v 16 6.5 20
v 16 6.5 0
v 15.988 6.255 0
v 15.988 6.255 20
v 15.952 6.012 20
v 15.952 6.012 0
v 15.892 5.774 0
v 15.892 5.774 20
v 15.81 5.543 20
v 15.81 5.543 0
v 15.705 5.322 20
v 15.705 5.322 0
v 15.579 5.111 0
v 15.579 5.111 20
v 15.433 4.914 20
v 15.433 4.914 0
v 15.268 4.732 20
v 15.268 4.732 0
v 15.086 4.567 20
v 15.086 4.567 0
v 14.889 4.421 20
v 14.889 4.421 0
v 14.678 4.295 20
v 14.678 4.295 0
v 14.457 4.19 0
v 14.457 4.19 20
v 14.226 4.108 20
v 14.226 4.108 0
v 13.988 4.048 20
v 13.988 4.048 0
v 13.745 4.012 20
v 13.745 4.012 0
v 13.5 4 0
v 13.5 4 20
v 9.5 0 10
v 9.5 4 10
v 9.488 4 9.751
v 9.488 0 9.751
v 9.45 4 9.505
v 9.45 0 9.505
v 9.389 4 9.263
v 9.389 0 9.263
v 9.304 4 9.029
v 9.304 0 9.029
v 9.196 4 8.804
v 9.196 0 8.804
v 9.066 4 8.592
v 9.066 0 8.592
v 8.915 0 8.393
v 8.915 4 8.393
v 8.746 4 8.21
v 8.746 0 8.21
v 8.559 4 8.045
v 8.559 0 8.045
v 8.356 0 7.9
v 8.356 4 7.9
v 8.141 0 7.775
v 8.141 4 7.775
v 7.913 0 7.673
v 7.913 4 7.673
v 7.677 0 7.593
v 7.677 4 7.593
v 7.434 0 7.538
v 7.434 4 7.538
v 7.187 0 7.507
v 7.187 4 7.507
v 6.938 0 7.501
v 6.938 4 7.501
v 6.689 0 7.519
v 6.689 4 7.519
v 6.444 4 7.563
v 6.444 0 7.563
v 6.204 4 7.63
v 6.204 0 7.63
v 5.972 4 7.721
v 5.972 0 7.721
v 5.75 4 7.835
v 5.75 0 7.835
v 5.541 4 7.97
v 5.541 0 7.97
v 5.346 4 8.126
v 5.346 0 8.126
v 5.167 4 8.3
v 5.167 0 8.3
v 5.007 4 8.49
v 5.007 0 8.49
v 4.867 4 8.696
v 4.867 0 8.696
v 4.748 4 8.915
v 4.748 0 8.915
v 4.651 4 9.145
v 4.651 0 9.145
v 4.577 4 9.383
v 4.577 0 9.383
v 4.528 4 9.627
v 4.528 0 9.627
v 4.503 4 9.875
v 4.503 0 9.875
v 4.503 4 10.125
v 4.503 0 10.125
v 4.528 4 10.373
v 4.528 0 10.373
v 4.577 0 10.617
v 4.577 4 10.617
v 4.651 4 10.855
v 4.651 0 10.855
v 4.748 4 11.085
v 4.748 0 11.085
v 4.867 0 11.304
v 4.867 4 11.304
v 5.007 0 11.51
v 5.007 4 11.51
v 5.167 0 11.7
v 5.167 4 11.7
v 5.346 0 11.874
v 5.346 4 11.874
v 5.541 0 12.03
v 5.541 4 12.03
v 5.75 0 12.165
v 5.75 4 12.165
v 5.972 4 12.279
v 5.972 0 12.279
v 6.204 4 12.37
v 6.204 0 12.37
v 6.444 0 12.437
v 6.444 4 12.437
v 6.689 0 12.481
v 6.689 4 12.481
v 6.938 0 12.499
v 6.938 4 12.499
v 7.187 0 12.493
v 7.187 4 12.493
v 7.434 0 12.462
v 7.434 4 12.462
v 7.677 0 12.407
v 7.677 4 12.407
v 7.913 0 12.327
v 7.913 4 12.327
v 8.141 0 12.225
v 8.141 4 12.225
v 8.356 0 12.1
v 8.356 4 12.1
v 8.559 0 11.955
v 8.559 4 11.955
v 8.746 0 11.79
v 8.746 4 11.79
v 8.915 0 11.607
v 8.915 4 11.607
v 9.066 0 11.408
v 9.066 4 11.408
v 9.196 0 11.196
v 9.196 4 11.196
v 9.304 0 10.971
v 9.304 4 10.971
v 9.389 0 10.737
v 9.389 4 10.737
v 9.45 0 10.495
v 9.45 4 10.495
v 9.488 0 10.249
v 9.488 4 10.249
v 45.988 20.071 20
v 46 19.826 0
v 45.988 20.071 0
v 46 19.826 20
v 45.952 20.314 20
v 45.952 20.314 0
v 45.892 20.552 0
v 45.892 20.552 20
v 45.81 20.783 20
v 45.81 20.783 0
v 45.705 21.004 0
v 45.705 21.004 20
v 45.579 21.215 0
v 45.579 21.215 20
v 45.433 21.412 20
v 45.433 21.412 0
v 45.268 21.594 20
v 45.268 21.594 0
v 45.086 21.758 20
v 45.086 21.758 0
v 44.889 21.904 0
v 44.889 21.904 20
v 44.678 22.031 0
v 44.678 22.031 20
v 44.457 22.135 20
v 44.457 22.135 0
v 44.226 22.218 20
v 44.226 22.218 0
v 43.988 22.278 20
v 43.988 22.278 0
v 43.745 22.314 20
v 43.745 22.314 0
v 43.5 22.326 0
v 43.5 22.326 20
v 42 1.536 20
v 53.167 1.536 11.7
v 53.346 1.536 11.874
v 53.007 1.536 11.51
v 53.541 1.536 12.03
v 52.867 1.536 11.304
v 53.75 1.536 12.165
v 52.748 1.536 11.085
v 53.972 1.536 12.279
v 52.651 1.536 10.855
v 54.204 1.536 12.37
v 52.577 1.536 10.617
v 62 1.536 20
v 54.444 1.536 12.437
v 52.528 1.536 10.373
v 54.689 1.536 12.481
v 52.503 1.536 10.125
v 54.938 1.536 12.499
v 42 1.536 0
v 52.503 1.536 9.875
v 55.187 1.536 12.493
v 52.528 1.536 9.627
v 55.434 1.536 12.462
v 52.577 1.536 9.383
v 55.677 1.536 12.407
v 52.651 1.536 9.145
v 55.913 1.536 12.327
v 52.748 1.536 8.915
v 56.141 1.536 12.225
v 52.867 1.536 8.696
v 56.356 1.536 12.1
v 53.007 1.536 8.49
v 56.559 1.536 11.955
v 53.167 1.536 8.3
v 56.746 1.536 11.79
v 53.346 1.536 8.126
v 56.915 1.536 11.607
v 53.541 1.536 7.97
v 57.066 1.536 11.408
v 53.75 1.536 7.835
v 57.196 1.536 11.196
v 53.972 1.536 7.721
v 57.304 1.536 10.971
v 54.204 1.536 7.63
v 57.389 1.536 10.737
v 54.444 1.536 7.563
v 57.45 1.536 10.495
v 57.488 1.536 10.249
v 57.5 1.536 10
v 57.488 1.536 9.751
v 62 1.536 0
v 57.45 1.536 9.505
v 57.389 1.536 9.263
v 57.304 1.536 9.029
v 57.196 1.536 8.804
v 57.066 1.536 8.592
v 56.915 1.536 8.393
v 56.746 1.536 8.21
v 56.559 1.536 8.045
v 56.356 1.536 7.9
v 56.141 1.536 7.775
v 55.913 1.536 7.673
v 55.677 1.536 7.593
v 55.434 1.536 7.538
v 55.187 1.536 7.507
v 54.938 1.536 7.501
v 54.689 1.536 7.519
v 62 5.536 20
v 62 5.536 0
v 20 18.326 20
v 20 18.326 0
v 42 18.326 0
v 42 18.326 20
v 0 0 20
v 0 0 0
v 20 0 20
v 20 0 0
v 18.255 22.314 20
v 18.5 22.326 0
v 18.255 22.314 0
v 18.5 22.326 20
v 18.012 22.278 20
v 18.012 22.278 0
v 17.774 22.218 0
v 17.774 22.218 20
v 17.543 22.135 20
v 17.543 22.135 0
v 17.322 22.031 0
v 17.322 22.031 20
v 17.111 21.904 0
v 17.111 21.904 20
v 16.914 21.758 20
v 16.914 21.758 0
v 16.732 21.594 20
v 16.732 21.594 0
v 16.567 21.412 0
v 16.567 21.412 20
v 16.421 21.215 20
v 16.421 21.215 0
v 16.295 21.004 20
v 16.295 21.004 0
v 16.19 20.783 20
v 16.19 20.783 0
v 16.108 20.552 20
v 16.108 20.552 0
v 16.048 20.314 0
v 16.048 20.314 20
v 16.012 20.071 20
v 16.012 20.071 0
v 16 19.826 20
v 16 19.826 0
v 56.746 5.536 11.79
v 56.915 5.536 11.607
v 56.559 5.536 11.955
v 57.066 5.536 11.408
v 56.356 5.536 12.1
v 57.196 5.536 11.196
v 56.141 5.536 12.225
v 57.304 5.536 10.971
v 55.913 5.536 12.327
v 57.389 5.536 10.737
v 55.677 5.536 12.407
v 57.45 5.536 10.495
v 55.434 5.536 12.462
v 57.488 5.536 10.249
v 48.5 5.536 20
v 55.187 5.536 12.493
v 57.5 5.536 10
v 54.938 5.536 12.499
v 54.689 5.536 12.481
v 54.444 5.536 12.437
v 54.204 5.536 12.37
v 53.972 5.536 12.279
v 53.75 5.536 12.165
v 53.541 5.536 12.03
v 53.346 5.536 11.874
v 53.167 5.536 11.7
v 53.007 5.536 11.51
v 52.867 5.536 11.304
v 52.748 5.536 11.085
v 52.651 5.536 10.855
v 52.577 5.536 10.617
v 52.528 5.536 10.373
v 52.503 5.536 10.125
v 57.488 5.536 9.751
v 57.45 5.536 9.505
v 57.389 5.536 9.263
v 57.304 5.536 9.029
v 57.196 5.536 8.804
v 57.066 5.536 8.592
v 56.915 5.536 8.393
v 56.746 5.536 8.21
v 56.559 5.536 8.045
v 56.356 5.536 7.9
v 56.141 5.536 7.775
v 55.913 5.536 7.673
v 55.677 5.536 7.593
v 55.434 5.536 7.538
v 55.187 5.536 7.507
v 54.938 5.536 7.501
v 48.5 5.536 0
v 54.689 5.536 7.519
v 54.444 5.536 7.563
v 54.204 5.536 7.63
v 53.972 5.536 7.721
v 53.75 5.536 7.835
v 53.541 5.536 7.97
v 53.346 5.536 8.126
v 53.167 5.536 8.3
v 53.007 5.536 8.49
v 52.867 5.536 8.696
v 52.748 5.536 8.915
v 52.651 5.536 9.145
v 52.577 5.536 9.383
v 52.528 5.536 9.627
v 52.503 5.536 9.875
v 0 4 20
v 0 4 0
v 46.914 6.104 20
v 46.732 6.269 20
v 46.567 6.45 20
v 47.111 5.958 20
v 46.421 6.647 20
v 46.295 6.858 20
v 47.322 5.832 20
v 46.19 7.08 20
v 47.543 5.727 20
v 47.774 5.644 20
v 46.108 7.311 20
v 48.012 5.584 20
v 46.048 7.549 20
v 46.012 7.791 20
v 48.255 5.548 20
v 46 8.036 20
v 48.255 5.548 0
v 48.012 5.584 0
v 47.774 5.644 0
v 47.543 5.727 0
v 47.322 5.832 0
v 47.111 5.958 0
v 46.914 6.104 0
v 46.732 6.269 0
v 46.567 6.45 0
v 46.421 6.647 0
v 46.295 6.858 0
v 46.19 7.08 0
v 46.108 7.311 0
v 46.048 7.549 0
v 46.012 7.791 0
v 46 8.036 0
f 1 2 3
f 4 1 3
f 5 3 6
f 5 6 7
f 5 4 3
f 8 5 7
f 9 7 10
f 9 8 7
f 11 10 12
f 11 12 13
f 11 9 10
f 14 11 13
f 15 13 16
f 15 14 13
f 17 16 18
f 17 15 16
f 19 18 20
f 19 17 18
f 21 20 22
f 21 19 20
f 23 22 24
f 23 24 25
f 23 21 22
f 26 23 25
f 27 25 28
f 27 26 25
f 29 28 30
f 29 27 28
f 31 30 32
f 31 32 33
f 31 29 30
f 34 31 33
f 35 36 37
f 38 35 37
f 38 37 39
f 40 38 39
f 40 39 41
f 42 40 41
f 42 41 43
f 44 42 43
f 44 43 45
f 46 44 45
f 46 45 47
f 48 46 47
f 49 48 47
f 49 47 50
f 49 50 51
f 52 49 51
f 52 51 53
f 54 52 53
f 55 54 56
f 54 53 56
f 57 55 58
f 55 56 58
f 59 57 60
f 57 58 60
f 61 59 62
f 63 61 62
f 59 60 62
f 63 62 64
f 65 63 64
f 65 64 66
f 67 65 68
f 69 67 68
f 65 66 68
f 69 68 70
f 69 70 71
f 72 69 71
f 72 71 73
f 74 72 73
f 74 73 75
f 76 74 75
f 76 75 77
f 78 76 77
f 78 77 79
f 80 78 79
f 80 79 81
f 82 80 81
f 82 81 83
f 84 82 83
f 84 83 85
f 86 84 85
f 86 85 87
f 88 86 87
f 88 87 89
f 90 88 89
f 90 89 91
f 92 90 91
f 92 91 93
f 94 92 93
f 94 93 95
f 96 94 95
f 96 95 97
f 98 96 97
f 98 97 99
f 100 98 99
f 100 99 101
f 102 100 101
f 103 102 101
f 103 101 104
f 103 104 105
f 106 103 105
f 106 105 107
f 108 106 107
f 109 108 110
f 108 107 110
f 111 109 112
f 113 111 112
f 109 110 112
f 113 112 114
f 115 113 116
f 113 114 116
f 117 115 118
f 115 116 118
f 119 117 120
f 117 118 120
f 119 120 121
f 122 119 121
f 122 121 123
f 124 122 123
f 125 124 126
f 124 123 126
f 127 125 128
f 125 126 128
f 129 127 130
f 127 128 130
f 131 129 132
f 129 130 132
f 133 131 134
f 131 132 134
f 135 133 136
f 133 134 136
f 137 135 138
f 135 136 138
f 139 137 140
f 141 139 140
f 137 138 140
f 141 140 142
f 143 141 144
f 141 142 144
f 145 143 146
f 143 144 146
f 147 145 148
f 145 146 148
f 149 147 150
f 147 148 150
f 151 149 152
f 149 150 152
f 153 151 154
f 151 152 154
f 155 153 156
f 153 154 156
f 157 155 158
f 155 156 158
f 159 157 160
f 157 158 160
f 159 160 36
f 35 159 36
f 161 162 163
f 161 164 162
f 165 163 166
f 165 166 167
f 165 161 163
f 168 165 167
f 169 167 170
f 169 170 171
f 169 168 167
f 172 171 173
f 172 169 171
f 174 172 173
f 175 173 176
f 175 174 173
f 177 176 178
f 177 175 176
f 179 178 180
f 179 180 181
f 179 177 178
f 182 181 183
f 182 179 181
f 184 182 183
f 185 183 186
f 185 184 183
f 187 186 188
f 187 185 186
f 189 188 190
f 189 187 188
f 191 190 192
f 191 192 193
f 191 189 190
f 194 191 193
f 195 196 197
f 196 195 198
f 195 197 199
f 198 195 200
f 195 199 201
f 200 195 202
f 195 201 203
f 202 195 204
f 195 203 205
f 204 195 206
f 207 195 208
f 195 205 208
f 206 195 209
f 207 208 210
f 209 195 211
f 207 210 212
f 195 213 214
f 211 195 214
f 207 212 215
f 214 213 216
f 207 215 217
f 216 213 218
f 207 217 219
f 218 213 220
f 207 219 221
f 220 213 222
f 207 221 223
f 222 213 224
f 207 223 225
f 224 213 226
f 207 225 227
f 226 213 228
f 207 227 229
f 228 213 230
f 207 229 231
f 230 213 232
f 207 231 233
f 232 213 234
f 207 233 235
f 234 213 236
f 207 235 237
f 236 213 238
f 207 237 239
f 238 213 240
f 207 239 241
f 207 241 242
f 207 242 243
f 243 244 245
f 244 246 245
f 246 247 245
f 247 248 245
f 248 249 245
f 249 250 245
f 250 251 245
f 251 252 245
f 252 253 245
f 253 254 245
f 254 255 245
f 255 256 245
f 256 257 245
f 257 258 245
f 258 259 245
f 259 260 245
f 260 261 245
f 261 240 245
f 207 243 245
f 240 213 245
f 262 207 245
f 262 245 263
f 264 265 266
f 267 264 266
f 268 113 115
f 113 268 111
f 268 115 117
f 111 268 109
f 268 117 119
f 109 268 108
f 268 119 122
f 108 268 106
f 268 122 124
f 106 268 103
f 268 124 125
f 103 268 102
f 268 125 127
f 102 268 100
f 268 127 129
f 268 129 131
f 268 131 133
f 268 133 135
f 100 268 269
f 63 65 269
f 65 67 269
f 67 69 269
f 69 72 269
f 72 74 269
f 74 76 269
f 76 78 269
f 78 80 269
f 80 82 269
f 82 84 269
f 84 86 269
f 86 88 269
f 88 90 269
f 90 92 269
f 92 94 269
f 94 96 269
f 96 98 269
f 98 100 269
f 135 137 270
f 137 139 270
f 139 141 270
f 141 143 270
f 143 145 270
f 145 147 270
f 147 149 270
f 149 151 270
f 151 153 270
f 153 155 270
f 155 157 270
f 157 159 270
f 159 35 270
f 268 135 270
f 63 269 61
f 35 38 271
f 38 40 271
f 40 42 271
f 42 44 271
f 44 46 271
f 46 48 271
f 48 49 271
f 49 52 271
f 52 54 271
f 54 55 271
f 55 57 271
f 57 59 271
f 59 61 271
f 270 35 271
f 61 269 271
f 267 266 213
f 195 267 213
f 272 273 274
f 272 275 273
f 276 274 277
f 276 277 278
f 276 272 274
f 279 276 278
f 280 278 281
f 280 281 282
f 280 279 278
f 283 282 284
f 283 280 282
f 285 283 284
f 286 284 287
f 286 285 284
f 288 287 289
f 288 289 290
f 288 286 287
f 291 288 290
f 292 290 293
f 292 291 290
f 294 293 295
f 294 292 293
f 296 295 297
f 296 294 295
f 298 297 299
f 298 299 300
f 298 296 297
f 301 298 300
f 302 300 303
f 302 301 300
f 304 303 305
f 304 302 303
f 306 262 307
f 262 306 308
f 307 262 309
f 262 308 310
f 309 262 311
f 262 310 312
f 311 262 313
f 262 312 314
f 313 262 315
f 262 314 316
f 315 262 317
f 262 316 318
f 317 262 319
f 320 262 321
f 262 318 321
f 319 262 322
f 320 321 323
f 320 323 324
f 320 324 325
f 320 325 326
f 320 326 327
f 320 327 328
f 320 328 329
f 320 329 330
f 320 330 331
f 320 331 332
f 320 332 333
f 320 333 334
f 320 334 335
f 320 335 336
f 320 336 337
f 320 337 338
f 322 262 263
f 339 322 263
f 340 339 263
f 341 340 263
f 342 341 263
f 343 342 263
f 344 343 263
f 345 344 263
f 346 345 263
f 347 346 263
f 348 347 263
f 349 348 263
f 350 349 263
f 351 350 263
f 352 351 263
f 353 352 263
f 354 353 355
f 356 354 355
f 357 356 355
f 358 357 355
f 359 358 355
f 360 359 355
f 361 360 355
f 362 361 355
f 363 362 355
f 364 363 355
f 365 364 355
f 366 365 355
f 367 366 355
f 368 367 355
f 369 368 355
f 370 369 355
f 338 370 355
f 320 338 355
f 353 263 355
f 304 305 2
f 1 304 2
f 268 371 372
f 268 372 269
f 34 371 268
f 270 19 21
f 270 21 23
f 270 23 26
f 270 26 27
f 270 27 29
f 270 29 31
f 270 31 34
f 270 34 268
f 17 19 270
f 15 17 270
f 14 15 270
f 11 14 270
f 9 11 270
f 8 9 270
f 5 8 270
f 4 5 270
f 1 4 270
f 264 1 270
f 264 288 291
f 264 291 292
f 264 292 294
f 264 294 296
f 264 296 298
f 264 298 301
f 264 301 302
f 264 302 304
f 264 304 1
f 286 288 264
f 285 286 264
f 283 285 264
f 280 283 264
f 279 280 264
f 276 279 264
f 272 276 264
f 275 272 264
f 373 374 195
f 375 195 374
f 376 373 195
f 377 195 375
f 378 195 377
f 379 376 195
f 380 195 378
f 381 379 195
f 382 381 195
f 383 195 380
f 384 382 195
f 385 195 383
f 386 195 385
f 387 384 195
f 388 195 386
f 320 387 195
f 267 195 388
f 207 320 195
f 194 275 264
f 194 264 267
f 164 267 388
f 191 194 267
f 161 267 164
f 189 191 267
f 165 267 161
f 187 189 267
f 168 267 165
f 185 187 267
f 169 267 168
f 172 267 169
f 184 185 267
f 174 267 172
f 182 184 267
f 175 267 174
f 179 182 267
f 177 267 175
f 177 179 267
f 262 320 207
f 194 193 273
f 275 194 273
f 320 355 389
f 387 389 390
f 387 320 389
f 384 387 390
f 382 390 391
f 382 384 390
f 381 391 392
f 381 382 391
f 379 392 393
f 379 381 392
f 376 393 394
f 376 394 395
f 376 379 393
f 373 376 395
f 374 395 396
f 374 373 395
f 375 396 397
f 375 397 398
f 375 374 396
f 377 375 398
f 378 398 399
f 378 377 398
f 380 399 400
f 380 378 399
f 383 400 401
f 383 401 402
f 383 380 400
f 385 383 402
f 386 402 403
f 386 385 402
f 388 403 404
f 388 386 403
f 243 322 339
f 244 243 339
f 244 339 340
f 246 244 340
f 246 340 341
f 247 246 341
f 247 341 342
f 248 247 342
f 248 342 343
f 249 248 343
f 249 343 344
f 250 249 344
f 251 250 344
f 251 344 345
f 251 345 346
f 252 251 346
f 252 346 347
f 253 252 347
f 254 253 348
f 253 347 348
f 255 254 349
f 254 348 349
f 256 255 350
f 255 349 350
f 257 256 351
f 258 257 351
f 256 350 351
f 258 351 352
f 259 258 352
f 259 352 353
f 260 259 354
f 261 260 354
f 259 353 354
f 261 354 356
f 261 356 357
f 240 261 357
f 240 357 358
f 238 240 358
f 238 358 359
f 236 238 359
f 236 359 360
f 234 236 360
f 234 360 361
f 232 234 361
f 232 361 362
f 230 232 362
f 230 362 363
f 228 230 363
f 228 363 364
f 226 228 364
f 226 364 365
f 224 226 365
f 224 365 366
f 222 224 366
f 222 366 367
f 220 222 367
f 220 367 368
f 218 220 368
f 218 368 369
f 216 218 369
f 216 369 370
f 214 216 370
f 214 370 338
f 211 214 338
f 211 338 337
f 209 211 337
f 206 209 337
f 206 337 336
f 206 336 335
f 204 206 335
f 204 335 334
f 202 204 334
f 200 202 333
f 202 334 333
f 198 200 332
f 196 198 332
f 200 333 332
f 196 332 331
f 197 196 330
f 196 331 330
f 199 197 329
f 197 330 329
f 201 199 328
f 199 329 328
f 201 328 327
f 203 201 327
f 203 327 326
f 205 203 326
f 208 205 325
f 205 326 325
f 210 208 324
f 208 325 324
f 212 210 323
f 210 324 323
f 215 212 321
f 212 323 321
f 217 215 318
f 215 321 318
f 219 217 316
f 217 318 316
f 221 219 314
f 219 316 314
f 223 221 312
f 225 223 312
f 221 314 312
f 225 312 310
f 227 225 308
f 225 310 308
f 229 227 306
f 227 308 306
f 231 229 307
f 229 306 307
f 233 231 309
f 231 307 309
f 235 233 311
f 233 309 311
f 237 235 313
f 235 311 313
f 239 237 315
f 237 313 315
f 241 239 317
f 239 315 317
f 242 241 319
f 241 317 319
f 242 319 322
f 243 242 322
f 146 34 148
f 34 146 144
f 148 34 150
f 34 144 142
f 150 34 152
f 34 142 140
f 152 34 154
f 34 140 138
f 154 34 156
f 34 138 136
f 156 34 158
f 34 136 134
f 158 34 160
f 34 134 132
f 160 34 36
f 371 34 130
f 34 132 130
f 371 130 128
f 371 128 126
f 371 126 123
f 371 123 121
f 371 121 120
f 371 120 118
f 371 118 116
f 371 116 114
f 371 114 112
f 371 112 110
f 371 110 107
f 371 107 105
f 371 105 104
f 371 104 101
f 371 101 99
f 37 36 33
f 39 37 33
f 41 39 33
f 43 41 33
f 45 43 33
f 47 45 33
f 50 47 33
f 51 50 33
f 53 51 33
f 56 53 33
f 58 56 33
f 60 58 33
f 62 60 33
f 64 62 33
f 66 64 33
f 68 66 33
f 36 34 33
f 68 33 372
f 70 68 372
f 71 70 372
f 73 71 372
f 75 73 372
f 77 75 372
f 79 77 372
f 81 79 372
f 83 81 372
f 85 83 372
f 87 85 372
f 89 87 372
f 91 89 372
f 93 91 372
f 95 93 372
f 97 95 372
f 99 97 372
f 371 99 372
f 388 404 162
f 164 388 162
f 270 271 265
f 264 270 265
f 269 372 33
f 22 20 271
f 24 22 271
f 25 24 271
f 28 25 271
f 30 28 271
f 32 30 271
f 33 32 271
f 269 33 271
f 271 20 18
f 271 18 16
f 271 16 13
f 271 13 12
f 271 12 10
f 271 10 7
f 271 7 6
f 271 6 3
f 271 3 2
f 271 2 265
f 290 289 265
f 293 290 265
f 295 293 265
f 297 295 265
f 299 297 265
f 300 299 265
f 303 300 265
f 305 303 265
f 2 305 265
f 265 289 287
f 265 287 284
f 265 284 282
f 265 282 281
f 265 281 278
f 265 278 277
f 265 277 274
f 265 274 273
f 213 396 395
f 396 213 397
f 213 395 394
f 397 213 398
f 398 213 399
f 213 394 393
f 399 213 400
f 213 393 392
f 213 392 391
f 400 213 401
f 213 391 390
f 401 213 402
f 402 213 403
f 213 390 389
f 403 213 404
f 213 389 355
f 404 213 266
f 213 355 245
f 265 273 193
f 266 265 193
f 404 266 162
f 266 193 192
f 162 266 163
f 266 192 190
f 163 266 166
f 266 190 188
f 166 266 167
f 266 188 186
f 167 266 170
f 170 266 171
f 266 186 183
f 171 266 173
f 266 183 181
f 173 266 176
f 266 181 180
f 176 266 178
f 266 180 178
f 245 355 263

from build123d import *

# Parameters (mm, degrees)
BOSS_EXTRUDE1_DEPTH = 20
FILLET2_R           = 2.5
SKETCH2_R           = 2.5
CUT_EXTRUDE1_DEPTH  = 10
SKETCH3_R           = 2.5
CUT_EXTRUDE2_DEPTH  = 10


with BuildPart() as part:
    # Sketch1 → Boss-Extrude1 (new body)
    with BuildSketch(Plane.XY):
        Polygon((0, 0), (20, 0), (20, 18.325792173), (42, 18.325792173), (42, 1.536318489), (62, 1.536318489), (62, 5.536318489), (46, 5.536318489), (46, 22.325792173), (16, 22.325792173), (16, 4), (0, 4), align=None)
    extrude(amount=BOSS_EXTRUDE1_DEPTH)

    # Fillet2
    fillet2_edges = [part.edges().sort_by_distance(p)[0] for p in [
        (16, 4, 10),
        (16, 22.325792173, 10),
        (46, 22.325792173, 10),
        (46, 5.536318489, 10),
    ]]
    fillet(fillet2_edges, radius=FILLET2_R)

    # Sketch2 → Cut-Extrude1 (cut)
    with BuildSketch(Plane(origin=(0, 4, 0), x_dir=(1, 0, 0), z_dir=(0, 1, 0))):
        with Locations((7, -10)):
            Circle(SKETCH2_R)
    extrude(amount=-CUT_EXTRUDE1_DEPTH, mode=Mode.SUBTRACT)

    # Sketch3 → Cut-Extrude2 (cut)
    with BuildSketch(Plane(origin=(0, 5.536318489, 0), x_dir=(1, 0, 0), z_dir=(0, 1, 0))):
        with Locations((55, -10)):
            Circle(SKETCH3_R)
    extrude(amount=-CUT_EXTRUDE2_DEPTH, mode=Mode.SUBTRACT)


solid = part.part
